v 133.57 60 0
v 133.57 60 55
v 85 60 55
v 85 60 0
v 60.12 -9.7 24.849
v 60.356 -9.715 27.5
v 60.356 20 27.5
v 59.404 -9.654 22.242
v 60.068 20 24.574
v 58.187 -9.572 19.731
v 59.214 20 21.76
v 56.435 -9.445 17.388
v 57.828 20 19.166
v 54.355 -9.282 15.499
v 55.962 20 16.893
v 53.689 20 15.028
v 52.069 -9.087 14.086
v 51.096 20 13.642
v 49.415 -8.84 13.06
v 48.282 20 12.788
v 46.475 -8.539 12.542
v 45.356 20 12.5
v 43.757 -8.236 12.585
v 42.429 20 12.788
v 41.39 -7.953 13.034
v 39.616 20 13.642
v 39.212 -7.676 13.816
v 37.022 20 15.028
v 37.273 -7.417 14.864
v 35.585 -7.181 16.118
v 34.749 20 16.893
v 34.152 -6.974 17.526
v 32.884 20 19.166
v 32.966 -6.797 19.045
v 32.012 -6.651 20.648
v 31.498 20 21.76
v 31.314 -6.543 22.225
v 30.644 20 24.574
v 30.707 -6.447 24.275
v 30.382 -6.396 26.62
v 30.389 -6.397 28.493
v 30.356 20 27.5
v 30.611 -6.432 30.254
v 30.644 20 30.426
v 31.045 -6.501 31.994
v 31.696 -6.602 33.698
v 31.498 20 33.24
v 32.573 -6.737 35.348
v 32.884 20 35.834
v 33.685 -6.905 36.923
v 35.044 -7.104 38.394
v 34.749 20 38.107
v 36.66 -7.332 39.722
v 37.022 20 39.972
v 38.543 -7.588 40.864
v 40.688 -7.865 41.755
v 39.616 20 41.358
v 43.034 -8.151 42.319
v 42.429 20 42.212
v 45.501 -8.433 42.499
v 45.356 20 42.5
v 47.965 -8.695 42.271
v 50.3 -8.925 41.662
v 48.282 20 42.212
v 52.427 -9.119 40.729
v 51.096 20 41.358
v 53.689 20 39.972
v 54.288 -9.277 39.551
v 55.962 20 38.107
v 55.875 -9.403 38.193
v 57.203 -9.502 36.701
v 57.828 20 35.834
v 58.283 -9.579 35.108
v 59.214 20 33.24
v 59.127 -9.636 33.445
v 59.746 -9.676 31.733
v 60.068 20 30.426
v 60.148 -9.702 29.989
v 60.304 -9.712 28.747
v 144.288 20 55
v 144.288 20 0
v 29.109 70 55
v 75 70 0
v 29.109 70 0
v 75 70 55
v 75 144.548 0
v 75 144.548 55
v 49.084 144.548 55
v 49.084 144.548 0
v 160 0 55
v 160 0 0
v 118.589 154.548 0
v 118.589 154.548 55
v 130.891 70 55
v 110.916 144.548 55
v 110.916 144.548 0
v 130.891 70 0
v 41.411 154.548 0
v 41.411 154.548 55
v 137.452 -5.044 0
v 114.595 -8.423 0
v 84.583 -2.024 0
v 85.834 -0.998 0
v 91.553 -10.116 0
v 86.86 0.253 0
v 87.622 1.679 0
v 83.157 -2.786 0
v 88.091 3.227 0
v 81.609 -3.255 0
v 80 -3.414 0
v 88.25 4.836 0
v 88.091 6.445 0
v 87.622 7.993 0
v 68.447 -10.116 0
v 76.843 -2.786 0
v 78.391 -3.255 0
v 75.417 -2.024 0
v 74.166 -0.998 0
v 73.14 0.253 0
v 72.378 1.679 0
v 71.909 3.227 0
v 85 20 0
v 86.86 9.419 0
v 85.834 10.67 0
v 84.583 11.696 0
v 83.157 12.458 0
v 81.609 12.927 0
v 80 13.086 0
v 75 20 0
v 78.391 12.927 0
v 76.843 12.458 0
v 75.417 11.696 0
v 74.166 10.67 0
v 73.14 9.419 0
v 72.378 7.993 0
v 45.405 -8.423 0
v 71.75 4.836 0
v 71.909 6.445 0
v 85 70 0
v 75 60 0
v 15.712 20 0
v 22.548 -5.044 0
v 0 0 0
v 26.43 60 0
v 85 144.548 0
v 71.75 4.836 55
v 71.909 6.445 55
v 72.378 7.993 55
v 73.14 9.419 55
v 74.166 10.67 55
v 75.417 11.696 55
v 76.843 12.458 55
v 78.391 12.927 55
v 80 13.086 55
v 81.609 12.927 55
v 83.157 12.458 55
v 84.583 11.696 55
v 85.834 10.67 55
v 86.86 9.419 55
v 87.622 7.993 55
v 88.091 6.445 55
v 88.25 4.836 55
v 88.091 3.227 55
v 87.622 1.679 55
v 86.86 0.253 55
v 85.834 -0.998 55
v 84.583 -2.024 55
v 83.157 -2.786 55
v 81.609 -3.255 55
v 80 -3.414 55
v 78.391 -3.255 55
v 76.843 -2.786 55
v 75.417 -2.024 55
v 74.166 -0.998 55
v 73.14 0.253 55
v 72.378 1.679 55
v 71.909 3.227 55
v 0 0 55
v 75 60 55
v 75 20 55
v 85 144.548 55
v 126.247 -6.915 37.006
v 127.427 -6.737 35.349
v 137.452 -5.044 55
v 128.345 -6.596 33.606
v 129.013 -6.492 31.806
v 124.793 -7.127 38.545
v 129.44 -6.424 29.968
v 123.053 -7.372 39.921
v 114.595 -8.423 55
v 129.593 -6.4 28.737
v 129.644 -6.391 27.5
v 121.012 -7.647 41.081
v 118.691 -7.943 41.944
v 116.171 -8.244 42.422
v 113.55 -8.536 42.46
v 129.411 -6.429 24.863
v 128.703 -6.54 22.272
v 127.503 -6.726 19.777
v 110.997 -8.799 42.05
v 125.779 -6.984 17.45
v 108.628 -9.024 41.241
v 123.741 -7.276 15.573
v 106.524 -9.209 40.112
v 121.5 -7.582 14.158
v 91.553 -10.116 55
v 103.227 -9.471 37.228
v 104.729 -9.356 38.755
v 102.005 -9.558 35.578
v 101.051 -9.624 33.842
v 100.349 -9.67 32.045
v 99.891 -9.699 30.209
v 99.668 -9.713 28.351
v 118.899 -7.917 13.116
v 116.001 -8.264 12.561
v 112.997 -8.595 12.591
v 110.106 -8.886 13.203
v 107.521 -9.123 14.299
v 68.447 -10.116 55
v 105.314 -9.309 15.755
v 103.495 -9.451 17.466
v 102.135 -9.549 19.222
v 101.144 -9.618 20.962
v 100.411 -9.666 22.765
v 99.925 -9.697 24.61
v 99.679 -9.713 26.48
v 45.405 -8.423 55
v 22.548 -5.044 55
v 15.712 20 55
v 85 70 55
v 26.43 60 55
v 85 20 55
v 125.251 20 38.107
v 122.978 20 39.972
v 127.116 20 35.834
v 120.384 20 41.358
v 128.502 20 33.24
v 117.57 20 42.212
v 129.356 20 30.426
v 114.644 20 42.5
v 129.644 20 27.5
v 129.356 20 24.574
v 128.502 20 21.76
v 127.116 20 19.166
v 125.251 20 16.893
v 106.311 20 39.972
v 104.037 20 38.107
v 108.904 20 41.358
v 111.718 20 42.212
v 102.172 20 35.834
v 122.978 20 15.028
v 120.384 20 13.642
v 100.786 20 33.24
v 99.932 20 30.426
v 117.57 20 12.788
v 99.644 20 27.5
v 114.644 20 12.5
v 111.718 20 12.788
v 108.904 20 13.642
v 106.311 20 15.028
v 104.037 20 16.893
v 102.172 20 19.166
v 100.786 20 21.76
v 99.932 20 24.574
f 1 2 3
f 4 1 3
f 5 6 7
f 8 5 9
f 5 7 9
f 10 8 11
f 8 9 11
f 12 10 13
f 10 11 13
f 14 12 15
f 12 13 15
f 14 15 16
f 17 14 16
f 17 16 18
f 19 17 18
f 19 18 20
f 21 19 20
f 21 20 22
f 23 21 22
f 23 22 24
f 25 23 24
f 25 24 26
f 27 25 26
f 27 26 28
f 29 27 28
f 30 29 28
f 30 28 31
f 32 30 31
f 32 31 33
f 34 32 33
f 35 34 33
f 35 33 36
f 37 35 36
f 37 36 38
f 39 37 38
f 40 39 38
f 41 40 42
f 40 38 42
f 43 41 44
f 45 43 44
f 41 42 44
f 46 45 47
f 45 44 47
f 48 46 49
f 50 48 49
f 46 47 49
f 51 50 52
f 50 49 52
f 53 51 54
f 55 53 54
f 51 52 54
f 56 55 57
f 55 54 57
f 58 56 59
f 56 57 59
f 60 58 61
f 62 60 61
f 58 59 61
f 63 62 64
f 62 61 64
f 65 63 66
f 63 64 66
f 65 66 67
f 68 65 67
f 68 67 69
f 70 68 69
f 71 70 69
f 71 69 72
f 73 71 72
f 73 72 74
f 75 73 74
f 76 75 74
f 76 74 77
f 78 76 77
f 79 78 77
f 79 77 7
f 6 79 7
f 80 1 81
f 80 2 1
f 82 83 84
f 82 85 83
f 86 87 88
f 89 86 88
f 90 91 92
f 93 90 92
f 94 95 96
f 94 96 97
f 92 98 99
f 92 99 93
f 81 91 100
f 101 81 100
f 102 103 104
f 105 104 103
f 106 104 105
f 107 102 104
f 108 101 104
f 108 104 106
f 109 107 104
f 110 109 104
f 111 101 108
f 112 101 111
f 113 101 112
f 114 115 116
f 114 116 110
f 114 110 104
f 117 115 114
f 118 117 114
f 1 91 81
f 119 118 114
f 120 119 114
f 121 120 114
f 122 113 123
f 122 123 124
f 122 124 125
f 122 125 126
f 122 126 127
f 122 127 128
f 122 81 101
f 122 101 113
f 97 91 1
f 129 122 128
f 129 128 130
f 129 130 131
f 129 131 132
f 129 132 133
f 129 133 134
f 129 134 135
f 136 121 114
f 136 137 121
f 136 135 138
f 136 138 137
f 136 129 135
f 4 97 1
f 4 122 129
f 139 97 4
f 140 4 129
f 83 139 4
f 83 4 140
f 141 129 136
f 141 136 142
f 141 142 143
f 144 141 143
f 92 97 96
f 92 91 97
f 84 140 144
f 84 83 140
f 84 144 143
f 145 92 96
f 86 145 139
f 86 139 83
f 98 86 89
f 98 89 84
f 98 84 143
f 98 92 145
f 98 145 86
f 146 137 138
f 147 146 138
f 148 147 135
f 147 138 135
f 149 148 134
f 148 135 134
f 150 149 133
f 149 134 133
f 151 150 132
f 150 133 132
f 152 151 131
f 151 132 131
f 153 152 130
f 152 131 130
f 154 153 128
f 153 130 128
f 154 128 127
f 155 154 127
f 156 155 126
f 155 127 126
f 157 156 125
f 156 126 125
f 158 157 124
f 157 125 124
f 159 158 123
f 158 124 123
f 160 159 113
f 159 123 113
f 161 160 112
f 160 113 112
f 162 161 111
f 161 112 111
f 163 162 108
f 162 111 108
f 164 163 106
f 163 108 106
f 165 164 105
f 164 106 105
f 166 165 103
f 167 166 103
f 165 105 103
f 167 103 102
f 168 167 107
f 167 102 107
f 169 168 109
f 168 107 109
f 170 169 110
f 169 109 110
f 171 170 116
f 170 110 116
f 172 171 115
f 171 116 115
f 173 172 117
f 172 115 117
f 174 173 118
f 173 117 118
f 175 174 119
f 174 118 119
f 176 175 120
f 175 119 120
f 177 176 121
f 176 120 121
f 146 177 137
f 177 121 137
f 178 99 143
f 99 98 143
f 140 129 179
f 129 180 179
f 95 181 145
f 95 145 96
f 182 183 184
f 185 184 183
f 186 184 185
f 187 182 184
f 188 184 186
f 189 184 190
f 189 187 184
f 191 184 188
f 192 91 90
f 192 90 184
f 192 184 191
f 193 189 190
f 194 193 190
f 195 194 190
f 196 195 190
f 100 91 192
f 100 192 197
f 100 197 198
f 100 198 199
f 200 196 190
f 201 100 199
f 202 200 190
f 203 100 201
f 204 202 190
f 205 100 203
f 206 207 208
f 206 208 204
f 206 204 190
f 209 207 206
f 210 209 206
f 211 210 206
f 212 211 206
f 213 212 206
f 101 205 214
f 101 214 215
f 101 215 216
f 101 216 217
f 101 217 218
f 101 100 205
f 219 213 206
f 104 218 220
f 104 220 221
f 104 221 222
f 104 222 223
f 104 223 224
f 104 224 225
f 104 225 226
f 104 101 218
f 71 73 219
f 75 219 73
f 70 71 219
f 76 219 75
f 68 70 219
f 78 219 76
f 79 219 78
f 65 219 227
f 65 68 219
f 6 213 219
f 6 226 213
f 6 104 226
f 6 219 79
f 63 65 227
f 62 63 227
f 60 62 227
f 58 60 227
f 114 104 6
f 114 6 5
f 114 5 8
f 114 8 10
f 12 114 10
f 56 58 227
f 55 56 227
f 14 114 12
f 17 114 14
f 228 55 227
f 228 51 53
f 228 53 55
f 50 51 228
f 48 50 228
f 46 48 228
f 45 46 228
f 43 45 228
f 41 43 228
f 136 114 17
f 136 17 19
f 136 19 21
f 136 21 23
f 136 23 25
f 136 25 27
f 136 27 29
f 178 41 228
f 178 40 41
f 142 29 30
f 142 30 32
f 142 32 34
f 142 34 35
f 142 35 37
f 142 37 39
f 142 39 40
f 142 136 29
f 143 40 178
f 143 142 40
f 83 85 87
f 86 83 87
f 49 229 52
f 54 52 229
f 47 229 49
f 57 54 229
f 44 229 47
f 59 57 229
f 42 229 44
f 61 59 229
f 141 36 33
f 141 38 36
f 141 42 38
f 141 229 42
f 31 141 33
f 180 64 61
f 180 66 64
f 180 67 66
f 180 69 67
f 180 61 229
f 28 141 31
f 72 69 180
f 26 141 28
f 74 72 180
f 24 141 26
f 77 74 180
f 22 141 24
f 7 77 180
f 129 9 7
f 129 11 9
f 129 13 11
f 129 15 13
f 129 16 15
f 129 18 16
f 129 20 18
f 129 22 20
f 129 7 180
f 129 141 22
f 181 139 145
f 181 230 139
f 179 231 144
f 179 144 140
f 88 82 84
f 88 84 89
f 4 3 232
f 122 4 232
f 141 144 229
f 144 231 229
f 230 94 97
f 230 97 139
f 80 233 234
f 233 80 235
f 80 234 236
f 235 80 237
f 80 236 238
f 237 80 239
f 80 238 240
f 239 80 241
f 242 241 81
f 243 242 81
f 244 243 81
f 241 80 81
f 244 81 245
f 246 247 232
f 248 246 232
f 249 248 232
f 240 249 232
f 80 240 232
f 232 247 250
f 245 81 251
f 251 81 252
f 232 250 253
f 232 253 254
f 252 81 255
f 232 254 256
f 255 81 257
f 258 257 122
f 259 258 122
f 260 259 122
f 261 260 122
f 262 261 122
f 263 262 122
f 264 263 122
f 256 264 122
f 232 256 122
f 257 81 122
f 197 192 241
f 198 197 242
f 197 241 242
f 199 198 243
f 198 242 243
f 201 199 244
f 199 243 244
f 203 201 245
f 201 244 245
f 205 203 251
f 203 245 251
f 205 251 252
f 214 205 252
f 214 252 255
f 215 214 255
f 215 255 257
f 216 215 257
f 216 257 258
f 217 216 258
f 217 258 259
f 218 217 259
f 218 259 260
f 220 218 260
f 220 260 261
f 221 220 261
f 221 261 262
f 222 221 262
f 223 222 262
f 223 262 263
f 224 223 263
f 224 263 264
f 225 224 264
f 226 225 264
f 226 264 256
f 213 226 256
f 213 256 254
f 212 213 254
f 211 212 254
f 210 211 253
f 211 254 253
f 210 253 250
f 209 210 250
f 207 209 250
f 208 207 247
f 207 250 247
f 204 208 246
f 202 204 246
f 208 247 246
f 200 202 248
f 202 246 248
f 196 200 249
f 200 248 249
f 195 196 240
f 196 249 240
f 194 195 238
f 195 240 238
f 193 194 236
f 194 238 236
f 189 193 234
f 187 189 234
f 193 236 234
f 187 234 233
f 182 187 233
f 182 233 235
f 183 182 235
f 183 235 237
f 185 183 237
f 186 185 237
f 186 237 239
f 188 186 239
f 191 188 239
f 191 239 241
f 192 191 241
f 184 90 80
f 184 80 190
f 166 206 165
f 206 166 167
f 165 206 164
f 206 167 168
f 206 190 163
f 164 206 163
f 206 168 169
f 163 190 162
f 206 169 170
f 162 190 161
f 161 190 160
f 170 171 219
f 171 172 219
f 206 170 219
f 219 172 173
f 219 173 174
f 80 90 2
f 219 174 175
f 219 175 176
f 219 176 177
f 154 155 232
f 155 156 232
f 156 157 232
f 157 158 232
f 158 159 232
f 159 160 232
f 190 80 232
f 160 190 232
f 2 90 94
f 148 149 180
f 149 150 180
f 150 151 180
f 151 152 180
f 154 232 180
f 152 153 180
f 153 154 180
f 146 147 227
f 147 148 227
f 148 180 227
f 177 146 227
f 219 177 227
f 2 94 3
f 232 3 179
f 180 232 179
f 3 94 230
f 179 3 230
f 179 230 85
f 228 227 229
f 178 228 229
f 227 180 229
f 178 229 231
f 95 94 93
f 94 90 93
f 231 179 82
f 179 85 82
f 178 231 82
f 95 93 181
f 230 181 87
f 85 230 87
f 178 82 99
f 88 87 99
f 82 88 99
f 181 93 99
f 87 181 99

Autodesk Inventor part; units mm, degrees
ref_plane "YZ Plane" through (0, 0, 0) normal (1, 0, 0) x (0, 1, 0)
ref_plane "XZ Plane" through (0, 0, 0) normal (0, 1, 0) x (-1, 0, 0)
ref_plane "XY Plane" through (0, 0, 0) normal (0, 0, 1) x (1, 0, 0)
sketch "Sketch1" plane through (0, 0, 0) normal (0, 0, 1) x (1, 0, 0)
  line L0 (0, 0) -> (160, 0)
  line L1 (160, 0) -> (118.589, 154.5481)
  line L2 (41.411, 154.5481) -> (0, 0)
  line L3 (41.411, 154.5481) -> (118.589, 154.5481)
  dimension "d0" = 160
  dimension "d1" = 160
  dimension "d2" = 75
  dimension "d8" = 75
extrude "Extrusion1" add sketch "Sketch1" along normal blind 55
sketch "Sketch6" plane through (0, 0, 55) normal (0, 0, 1) x (1, 0, 0)
  line L0 (0, 0) -> (160, 0) construction
  line L1 (160, 0) -> (118.589, 154.5481) construction
  line L2 (118.589, 154.5481) -> (41.411, 154.5481) construction
  line L3 (41.411, 154.5481) -> (0, 0) construction
  line L4 (110.9157, 144.5481) -> (146.9677, 10) construction
  line L5 (146.9677, 10) -> (13.0323, 10) construction
  line L6 (13.0323, 10) -> (49.0843, 144.5481) construction
  line L7 (49.0843, 144.5481) -> (110.9157, 144.5481) construction
  line L8 (85, 144.5481) -> (75, 144.5481) construction
  line L9 (75, 144.5481) -> (75, 10) construction
  line L10 (75, 10) -> (85, 10) construction
  line L11 (85, 10) -> (85, 144.5481) construction
  line L12 (133.5703, 60) -> (26.4297, 60) construction
  line L13 (26.4297, 60) -> (26.4297, 70) construction
  line L14 (26.4297, 70) -> (133.5703, 70) construction
  line L15 (133.5703, 70) -> (133.5703, 60) construction
  line L16 (133.5703, 60) -> (146.9677, 10)
  line L17 (85, 10) -> (146.9677, 10)
  line L18 (0, 0) -> (160, 0) construction
  line L19 (133.5703, 60) -> (85, 60)
  line L20 (85, 60) -> (85, 10)
  line L21 (75, 10) -> (75, 60)
  line L22 (26.4297, 60) -> (75, 60)
  line L23 (26.4297, 60) -> (13.0323, 10)
  line L24 (13.0323, 10) -> (75, 10)
  line L25 (75, 70) -> (75, 144.5481)
  line L26 (75, 144.5481) -> (49.0843, 144.5481)
  line L27 (75, 70) -> (29.1092, 70)
  line L28 (29.1092, 70) -> (49.0843, 144.5481)
  line L29 (85, 144.5481) -> (110.9157, 144.5481)
  line L30 (110.9157, 144.5481) -> (130.8908, 70)
  line L31 (130.8908, 70) -> (85, 70)
  line L32 (85, 70) -> (85, 144.5481)
  point P0 (80, 10)
  dimension "d22" = 10
  dimension "d23" = 10
  dimension "d24" = 10
  dimension "d25" = 50
extrude "Extrusion5" cut sketch "Sketch6" against normal through all
sketch "Sketch7" plane through (0, 0, 0) normal (0, 0, -1) x (-1, 0, 0)
  circle A0 centre (-80, 304.672) radius 315 construction
  line L0 (0, 0) -> (-160, 0) projected
  arc A1 (-160, 0) -> (0, 0) centre (-80, 304.672) ccw
  dimension "d28" = 630
extrude "Extrusion6" add sketch "Sketch7" against normal blind 55
sketch "Sketch8" plane through (0, 0, 0) normal (0, 0, -1) x (-1, 0, 0)
  circle A0 centre (-80, 4.836) radius 8.25
  line L0 (-15.7117, 20) -> (-144.2883, 20) construction
  line L1 (-13.0323, 10) -> (-15.7117, 20)
  line L2 (-15.7117, 20) -> (-75, 20)
  line L3 (-75, 10) -> (-75, 60) projected
  line L4 (-75, 20) -> (-75, 10)
  line L5 (-75, 10) -> (-13.0323, 10) projected
  line L6 (-75, 10) -> (-13.0323, 10)
  line L7 (-26.4297, 60) -> (-13.0323, 10) projected
  line L8 (-85, 10) -> (-146.9677, 10) projected
  line L9 (-146.9677, 10) -> (-144.2883, 20)
  line L10 (-133.5703, 60) -> (-146.9677, 10) projected
  line L11 (-144.2883, 20) -> (-85, 20)
  line L12 (-85, 60) -> (-85, 10) projected
  line L13 (-85, 20) -> (-85, 10)
  line L14 (-85, 10) -> (-146.9677, 10)
  line L15 (-118.589, 154.5481) -> (-41.411, 154.5481) projected
  arc A1 (-160, 0) -> (0, 0) centre (-80, 304.672) ccw projected
  line L16 (0, -10.328) -> (-160, -10.328) construction
  arc A2 (-160, 0) -> (0, 0) centre (-80, 304.672) ccw projected
  line L17 (-0.263, 4.836) -> (-159.737, 4.836) construction
  point P0 (-80, 154.5481)
  dimension "d31" = 16.5
  dimension "d32" = 20
extrude "Extrusion8" add sketch "Sketch8" against normal blind 55 contours L5 L3 A0 | A0 L3 L2 L1 L5 | L8 L9 L11 L12 A0 | A0 L12 L8
extrude "Extrusion7" cut sketch "Sketch8" against normal through all contours A0 L8 L12 L3 L5 | L5 L3 A0 | A0 L12 L8
sketch "Sketch9" plane through (15.7117, 20, 0) normal (0, 1, 0) x (1, 0, 0)
  line L0 (0, 0) -> (59.2883, 0) projected
  line L1 (0, -55) -> (0, 0) projected
  line L2 (59.2883, -55) -> (0, -55) projected
  line L3 (59.2883, 0) -> (59.2883, -55) projected
  line L4 (69.2883, 0) -> (128.5765, 0) projected
  line L5 (69.2883, -55) -> (69.2883, 0) projected
  line L6 (128.5765, -55) -> (69.2883, -55) projected
  line L7 (128.5765, 0) -> (128.5765, -55) projected
  circle A0 centre (29.6441, -27.5) radius 15
  circle A1 centre (98.9324, -27.5) radius 15
  point P0 (-15.7117, 0)
  point P1 (29.6441, 0)
  point P2 (98.9324, 0)
  point P3 (0, -27.5)
  point P4 (69.2883, -27.5)
  dimension "d37" = 30
  dimension "d38" = 30
extrude "Extrusion9" cut sketch "Sketch9" against normal through all contours A0 | A1
properties part number "CA001" material "ABS Plastic"
